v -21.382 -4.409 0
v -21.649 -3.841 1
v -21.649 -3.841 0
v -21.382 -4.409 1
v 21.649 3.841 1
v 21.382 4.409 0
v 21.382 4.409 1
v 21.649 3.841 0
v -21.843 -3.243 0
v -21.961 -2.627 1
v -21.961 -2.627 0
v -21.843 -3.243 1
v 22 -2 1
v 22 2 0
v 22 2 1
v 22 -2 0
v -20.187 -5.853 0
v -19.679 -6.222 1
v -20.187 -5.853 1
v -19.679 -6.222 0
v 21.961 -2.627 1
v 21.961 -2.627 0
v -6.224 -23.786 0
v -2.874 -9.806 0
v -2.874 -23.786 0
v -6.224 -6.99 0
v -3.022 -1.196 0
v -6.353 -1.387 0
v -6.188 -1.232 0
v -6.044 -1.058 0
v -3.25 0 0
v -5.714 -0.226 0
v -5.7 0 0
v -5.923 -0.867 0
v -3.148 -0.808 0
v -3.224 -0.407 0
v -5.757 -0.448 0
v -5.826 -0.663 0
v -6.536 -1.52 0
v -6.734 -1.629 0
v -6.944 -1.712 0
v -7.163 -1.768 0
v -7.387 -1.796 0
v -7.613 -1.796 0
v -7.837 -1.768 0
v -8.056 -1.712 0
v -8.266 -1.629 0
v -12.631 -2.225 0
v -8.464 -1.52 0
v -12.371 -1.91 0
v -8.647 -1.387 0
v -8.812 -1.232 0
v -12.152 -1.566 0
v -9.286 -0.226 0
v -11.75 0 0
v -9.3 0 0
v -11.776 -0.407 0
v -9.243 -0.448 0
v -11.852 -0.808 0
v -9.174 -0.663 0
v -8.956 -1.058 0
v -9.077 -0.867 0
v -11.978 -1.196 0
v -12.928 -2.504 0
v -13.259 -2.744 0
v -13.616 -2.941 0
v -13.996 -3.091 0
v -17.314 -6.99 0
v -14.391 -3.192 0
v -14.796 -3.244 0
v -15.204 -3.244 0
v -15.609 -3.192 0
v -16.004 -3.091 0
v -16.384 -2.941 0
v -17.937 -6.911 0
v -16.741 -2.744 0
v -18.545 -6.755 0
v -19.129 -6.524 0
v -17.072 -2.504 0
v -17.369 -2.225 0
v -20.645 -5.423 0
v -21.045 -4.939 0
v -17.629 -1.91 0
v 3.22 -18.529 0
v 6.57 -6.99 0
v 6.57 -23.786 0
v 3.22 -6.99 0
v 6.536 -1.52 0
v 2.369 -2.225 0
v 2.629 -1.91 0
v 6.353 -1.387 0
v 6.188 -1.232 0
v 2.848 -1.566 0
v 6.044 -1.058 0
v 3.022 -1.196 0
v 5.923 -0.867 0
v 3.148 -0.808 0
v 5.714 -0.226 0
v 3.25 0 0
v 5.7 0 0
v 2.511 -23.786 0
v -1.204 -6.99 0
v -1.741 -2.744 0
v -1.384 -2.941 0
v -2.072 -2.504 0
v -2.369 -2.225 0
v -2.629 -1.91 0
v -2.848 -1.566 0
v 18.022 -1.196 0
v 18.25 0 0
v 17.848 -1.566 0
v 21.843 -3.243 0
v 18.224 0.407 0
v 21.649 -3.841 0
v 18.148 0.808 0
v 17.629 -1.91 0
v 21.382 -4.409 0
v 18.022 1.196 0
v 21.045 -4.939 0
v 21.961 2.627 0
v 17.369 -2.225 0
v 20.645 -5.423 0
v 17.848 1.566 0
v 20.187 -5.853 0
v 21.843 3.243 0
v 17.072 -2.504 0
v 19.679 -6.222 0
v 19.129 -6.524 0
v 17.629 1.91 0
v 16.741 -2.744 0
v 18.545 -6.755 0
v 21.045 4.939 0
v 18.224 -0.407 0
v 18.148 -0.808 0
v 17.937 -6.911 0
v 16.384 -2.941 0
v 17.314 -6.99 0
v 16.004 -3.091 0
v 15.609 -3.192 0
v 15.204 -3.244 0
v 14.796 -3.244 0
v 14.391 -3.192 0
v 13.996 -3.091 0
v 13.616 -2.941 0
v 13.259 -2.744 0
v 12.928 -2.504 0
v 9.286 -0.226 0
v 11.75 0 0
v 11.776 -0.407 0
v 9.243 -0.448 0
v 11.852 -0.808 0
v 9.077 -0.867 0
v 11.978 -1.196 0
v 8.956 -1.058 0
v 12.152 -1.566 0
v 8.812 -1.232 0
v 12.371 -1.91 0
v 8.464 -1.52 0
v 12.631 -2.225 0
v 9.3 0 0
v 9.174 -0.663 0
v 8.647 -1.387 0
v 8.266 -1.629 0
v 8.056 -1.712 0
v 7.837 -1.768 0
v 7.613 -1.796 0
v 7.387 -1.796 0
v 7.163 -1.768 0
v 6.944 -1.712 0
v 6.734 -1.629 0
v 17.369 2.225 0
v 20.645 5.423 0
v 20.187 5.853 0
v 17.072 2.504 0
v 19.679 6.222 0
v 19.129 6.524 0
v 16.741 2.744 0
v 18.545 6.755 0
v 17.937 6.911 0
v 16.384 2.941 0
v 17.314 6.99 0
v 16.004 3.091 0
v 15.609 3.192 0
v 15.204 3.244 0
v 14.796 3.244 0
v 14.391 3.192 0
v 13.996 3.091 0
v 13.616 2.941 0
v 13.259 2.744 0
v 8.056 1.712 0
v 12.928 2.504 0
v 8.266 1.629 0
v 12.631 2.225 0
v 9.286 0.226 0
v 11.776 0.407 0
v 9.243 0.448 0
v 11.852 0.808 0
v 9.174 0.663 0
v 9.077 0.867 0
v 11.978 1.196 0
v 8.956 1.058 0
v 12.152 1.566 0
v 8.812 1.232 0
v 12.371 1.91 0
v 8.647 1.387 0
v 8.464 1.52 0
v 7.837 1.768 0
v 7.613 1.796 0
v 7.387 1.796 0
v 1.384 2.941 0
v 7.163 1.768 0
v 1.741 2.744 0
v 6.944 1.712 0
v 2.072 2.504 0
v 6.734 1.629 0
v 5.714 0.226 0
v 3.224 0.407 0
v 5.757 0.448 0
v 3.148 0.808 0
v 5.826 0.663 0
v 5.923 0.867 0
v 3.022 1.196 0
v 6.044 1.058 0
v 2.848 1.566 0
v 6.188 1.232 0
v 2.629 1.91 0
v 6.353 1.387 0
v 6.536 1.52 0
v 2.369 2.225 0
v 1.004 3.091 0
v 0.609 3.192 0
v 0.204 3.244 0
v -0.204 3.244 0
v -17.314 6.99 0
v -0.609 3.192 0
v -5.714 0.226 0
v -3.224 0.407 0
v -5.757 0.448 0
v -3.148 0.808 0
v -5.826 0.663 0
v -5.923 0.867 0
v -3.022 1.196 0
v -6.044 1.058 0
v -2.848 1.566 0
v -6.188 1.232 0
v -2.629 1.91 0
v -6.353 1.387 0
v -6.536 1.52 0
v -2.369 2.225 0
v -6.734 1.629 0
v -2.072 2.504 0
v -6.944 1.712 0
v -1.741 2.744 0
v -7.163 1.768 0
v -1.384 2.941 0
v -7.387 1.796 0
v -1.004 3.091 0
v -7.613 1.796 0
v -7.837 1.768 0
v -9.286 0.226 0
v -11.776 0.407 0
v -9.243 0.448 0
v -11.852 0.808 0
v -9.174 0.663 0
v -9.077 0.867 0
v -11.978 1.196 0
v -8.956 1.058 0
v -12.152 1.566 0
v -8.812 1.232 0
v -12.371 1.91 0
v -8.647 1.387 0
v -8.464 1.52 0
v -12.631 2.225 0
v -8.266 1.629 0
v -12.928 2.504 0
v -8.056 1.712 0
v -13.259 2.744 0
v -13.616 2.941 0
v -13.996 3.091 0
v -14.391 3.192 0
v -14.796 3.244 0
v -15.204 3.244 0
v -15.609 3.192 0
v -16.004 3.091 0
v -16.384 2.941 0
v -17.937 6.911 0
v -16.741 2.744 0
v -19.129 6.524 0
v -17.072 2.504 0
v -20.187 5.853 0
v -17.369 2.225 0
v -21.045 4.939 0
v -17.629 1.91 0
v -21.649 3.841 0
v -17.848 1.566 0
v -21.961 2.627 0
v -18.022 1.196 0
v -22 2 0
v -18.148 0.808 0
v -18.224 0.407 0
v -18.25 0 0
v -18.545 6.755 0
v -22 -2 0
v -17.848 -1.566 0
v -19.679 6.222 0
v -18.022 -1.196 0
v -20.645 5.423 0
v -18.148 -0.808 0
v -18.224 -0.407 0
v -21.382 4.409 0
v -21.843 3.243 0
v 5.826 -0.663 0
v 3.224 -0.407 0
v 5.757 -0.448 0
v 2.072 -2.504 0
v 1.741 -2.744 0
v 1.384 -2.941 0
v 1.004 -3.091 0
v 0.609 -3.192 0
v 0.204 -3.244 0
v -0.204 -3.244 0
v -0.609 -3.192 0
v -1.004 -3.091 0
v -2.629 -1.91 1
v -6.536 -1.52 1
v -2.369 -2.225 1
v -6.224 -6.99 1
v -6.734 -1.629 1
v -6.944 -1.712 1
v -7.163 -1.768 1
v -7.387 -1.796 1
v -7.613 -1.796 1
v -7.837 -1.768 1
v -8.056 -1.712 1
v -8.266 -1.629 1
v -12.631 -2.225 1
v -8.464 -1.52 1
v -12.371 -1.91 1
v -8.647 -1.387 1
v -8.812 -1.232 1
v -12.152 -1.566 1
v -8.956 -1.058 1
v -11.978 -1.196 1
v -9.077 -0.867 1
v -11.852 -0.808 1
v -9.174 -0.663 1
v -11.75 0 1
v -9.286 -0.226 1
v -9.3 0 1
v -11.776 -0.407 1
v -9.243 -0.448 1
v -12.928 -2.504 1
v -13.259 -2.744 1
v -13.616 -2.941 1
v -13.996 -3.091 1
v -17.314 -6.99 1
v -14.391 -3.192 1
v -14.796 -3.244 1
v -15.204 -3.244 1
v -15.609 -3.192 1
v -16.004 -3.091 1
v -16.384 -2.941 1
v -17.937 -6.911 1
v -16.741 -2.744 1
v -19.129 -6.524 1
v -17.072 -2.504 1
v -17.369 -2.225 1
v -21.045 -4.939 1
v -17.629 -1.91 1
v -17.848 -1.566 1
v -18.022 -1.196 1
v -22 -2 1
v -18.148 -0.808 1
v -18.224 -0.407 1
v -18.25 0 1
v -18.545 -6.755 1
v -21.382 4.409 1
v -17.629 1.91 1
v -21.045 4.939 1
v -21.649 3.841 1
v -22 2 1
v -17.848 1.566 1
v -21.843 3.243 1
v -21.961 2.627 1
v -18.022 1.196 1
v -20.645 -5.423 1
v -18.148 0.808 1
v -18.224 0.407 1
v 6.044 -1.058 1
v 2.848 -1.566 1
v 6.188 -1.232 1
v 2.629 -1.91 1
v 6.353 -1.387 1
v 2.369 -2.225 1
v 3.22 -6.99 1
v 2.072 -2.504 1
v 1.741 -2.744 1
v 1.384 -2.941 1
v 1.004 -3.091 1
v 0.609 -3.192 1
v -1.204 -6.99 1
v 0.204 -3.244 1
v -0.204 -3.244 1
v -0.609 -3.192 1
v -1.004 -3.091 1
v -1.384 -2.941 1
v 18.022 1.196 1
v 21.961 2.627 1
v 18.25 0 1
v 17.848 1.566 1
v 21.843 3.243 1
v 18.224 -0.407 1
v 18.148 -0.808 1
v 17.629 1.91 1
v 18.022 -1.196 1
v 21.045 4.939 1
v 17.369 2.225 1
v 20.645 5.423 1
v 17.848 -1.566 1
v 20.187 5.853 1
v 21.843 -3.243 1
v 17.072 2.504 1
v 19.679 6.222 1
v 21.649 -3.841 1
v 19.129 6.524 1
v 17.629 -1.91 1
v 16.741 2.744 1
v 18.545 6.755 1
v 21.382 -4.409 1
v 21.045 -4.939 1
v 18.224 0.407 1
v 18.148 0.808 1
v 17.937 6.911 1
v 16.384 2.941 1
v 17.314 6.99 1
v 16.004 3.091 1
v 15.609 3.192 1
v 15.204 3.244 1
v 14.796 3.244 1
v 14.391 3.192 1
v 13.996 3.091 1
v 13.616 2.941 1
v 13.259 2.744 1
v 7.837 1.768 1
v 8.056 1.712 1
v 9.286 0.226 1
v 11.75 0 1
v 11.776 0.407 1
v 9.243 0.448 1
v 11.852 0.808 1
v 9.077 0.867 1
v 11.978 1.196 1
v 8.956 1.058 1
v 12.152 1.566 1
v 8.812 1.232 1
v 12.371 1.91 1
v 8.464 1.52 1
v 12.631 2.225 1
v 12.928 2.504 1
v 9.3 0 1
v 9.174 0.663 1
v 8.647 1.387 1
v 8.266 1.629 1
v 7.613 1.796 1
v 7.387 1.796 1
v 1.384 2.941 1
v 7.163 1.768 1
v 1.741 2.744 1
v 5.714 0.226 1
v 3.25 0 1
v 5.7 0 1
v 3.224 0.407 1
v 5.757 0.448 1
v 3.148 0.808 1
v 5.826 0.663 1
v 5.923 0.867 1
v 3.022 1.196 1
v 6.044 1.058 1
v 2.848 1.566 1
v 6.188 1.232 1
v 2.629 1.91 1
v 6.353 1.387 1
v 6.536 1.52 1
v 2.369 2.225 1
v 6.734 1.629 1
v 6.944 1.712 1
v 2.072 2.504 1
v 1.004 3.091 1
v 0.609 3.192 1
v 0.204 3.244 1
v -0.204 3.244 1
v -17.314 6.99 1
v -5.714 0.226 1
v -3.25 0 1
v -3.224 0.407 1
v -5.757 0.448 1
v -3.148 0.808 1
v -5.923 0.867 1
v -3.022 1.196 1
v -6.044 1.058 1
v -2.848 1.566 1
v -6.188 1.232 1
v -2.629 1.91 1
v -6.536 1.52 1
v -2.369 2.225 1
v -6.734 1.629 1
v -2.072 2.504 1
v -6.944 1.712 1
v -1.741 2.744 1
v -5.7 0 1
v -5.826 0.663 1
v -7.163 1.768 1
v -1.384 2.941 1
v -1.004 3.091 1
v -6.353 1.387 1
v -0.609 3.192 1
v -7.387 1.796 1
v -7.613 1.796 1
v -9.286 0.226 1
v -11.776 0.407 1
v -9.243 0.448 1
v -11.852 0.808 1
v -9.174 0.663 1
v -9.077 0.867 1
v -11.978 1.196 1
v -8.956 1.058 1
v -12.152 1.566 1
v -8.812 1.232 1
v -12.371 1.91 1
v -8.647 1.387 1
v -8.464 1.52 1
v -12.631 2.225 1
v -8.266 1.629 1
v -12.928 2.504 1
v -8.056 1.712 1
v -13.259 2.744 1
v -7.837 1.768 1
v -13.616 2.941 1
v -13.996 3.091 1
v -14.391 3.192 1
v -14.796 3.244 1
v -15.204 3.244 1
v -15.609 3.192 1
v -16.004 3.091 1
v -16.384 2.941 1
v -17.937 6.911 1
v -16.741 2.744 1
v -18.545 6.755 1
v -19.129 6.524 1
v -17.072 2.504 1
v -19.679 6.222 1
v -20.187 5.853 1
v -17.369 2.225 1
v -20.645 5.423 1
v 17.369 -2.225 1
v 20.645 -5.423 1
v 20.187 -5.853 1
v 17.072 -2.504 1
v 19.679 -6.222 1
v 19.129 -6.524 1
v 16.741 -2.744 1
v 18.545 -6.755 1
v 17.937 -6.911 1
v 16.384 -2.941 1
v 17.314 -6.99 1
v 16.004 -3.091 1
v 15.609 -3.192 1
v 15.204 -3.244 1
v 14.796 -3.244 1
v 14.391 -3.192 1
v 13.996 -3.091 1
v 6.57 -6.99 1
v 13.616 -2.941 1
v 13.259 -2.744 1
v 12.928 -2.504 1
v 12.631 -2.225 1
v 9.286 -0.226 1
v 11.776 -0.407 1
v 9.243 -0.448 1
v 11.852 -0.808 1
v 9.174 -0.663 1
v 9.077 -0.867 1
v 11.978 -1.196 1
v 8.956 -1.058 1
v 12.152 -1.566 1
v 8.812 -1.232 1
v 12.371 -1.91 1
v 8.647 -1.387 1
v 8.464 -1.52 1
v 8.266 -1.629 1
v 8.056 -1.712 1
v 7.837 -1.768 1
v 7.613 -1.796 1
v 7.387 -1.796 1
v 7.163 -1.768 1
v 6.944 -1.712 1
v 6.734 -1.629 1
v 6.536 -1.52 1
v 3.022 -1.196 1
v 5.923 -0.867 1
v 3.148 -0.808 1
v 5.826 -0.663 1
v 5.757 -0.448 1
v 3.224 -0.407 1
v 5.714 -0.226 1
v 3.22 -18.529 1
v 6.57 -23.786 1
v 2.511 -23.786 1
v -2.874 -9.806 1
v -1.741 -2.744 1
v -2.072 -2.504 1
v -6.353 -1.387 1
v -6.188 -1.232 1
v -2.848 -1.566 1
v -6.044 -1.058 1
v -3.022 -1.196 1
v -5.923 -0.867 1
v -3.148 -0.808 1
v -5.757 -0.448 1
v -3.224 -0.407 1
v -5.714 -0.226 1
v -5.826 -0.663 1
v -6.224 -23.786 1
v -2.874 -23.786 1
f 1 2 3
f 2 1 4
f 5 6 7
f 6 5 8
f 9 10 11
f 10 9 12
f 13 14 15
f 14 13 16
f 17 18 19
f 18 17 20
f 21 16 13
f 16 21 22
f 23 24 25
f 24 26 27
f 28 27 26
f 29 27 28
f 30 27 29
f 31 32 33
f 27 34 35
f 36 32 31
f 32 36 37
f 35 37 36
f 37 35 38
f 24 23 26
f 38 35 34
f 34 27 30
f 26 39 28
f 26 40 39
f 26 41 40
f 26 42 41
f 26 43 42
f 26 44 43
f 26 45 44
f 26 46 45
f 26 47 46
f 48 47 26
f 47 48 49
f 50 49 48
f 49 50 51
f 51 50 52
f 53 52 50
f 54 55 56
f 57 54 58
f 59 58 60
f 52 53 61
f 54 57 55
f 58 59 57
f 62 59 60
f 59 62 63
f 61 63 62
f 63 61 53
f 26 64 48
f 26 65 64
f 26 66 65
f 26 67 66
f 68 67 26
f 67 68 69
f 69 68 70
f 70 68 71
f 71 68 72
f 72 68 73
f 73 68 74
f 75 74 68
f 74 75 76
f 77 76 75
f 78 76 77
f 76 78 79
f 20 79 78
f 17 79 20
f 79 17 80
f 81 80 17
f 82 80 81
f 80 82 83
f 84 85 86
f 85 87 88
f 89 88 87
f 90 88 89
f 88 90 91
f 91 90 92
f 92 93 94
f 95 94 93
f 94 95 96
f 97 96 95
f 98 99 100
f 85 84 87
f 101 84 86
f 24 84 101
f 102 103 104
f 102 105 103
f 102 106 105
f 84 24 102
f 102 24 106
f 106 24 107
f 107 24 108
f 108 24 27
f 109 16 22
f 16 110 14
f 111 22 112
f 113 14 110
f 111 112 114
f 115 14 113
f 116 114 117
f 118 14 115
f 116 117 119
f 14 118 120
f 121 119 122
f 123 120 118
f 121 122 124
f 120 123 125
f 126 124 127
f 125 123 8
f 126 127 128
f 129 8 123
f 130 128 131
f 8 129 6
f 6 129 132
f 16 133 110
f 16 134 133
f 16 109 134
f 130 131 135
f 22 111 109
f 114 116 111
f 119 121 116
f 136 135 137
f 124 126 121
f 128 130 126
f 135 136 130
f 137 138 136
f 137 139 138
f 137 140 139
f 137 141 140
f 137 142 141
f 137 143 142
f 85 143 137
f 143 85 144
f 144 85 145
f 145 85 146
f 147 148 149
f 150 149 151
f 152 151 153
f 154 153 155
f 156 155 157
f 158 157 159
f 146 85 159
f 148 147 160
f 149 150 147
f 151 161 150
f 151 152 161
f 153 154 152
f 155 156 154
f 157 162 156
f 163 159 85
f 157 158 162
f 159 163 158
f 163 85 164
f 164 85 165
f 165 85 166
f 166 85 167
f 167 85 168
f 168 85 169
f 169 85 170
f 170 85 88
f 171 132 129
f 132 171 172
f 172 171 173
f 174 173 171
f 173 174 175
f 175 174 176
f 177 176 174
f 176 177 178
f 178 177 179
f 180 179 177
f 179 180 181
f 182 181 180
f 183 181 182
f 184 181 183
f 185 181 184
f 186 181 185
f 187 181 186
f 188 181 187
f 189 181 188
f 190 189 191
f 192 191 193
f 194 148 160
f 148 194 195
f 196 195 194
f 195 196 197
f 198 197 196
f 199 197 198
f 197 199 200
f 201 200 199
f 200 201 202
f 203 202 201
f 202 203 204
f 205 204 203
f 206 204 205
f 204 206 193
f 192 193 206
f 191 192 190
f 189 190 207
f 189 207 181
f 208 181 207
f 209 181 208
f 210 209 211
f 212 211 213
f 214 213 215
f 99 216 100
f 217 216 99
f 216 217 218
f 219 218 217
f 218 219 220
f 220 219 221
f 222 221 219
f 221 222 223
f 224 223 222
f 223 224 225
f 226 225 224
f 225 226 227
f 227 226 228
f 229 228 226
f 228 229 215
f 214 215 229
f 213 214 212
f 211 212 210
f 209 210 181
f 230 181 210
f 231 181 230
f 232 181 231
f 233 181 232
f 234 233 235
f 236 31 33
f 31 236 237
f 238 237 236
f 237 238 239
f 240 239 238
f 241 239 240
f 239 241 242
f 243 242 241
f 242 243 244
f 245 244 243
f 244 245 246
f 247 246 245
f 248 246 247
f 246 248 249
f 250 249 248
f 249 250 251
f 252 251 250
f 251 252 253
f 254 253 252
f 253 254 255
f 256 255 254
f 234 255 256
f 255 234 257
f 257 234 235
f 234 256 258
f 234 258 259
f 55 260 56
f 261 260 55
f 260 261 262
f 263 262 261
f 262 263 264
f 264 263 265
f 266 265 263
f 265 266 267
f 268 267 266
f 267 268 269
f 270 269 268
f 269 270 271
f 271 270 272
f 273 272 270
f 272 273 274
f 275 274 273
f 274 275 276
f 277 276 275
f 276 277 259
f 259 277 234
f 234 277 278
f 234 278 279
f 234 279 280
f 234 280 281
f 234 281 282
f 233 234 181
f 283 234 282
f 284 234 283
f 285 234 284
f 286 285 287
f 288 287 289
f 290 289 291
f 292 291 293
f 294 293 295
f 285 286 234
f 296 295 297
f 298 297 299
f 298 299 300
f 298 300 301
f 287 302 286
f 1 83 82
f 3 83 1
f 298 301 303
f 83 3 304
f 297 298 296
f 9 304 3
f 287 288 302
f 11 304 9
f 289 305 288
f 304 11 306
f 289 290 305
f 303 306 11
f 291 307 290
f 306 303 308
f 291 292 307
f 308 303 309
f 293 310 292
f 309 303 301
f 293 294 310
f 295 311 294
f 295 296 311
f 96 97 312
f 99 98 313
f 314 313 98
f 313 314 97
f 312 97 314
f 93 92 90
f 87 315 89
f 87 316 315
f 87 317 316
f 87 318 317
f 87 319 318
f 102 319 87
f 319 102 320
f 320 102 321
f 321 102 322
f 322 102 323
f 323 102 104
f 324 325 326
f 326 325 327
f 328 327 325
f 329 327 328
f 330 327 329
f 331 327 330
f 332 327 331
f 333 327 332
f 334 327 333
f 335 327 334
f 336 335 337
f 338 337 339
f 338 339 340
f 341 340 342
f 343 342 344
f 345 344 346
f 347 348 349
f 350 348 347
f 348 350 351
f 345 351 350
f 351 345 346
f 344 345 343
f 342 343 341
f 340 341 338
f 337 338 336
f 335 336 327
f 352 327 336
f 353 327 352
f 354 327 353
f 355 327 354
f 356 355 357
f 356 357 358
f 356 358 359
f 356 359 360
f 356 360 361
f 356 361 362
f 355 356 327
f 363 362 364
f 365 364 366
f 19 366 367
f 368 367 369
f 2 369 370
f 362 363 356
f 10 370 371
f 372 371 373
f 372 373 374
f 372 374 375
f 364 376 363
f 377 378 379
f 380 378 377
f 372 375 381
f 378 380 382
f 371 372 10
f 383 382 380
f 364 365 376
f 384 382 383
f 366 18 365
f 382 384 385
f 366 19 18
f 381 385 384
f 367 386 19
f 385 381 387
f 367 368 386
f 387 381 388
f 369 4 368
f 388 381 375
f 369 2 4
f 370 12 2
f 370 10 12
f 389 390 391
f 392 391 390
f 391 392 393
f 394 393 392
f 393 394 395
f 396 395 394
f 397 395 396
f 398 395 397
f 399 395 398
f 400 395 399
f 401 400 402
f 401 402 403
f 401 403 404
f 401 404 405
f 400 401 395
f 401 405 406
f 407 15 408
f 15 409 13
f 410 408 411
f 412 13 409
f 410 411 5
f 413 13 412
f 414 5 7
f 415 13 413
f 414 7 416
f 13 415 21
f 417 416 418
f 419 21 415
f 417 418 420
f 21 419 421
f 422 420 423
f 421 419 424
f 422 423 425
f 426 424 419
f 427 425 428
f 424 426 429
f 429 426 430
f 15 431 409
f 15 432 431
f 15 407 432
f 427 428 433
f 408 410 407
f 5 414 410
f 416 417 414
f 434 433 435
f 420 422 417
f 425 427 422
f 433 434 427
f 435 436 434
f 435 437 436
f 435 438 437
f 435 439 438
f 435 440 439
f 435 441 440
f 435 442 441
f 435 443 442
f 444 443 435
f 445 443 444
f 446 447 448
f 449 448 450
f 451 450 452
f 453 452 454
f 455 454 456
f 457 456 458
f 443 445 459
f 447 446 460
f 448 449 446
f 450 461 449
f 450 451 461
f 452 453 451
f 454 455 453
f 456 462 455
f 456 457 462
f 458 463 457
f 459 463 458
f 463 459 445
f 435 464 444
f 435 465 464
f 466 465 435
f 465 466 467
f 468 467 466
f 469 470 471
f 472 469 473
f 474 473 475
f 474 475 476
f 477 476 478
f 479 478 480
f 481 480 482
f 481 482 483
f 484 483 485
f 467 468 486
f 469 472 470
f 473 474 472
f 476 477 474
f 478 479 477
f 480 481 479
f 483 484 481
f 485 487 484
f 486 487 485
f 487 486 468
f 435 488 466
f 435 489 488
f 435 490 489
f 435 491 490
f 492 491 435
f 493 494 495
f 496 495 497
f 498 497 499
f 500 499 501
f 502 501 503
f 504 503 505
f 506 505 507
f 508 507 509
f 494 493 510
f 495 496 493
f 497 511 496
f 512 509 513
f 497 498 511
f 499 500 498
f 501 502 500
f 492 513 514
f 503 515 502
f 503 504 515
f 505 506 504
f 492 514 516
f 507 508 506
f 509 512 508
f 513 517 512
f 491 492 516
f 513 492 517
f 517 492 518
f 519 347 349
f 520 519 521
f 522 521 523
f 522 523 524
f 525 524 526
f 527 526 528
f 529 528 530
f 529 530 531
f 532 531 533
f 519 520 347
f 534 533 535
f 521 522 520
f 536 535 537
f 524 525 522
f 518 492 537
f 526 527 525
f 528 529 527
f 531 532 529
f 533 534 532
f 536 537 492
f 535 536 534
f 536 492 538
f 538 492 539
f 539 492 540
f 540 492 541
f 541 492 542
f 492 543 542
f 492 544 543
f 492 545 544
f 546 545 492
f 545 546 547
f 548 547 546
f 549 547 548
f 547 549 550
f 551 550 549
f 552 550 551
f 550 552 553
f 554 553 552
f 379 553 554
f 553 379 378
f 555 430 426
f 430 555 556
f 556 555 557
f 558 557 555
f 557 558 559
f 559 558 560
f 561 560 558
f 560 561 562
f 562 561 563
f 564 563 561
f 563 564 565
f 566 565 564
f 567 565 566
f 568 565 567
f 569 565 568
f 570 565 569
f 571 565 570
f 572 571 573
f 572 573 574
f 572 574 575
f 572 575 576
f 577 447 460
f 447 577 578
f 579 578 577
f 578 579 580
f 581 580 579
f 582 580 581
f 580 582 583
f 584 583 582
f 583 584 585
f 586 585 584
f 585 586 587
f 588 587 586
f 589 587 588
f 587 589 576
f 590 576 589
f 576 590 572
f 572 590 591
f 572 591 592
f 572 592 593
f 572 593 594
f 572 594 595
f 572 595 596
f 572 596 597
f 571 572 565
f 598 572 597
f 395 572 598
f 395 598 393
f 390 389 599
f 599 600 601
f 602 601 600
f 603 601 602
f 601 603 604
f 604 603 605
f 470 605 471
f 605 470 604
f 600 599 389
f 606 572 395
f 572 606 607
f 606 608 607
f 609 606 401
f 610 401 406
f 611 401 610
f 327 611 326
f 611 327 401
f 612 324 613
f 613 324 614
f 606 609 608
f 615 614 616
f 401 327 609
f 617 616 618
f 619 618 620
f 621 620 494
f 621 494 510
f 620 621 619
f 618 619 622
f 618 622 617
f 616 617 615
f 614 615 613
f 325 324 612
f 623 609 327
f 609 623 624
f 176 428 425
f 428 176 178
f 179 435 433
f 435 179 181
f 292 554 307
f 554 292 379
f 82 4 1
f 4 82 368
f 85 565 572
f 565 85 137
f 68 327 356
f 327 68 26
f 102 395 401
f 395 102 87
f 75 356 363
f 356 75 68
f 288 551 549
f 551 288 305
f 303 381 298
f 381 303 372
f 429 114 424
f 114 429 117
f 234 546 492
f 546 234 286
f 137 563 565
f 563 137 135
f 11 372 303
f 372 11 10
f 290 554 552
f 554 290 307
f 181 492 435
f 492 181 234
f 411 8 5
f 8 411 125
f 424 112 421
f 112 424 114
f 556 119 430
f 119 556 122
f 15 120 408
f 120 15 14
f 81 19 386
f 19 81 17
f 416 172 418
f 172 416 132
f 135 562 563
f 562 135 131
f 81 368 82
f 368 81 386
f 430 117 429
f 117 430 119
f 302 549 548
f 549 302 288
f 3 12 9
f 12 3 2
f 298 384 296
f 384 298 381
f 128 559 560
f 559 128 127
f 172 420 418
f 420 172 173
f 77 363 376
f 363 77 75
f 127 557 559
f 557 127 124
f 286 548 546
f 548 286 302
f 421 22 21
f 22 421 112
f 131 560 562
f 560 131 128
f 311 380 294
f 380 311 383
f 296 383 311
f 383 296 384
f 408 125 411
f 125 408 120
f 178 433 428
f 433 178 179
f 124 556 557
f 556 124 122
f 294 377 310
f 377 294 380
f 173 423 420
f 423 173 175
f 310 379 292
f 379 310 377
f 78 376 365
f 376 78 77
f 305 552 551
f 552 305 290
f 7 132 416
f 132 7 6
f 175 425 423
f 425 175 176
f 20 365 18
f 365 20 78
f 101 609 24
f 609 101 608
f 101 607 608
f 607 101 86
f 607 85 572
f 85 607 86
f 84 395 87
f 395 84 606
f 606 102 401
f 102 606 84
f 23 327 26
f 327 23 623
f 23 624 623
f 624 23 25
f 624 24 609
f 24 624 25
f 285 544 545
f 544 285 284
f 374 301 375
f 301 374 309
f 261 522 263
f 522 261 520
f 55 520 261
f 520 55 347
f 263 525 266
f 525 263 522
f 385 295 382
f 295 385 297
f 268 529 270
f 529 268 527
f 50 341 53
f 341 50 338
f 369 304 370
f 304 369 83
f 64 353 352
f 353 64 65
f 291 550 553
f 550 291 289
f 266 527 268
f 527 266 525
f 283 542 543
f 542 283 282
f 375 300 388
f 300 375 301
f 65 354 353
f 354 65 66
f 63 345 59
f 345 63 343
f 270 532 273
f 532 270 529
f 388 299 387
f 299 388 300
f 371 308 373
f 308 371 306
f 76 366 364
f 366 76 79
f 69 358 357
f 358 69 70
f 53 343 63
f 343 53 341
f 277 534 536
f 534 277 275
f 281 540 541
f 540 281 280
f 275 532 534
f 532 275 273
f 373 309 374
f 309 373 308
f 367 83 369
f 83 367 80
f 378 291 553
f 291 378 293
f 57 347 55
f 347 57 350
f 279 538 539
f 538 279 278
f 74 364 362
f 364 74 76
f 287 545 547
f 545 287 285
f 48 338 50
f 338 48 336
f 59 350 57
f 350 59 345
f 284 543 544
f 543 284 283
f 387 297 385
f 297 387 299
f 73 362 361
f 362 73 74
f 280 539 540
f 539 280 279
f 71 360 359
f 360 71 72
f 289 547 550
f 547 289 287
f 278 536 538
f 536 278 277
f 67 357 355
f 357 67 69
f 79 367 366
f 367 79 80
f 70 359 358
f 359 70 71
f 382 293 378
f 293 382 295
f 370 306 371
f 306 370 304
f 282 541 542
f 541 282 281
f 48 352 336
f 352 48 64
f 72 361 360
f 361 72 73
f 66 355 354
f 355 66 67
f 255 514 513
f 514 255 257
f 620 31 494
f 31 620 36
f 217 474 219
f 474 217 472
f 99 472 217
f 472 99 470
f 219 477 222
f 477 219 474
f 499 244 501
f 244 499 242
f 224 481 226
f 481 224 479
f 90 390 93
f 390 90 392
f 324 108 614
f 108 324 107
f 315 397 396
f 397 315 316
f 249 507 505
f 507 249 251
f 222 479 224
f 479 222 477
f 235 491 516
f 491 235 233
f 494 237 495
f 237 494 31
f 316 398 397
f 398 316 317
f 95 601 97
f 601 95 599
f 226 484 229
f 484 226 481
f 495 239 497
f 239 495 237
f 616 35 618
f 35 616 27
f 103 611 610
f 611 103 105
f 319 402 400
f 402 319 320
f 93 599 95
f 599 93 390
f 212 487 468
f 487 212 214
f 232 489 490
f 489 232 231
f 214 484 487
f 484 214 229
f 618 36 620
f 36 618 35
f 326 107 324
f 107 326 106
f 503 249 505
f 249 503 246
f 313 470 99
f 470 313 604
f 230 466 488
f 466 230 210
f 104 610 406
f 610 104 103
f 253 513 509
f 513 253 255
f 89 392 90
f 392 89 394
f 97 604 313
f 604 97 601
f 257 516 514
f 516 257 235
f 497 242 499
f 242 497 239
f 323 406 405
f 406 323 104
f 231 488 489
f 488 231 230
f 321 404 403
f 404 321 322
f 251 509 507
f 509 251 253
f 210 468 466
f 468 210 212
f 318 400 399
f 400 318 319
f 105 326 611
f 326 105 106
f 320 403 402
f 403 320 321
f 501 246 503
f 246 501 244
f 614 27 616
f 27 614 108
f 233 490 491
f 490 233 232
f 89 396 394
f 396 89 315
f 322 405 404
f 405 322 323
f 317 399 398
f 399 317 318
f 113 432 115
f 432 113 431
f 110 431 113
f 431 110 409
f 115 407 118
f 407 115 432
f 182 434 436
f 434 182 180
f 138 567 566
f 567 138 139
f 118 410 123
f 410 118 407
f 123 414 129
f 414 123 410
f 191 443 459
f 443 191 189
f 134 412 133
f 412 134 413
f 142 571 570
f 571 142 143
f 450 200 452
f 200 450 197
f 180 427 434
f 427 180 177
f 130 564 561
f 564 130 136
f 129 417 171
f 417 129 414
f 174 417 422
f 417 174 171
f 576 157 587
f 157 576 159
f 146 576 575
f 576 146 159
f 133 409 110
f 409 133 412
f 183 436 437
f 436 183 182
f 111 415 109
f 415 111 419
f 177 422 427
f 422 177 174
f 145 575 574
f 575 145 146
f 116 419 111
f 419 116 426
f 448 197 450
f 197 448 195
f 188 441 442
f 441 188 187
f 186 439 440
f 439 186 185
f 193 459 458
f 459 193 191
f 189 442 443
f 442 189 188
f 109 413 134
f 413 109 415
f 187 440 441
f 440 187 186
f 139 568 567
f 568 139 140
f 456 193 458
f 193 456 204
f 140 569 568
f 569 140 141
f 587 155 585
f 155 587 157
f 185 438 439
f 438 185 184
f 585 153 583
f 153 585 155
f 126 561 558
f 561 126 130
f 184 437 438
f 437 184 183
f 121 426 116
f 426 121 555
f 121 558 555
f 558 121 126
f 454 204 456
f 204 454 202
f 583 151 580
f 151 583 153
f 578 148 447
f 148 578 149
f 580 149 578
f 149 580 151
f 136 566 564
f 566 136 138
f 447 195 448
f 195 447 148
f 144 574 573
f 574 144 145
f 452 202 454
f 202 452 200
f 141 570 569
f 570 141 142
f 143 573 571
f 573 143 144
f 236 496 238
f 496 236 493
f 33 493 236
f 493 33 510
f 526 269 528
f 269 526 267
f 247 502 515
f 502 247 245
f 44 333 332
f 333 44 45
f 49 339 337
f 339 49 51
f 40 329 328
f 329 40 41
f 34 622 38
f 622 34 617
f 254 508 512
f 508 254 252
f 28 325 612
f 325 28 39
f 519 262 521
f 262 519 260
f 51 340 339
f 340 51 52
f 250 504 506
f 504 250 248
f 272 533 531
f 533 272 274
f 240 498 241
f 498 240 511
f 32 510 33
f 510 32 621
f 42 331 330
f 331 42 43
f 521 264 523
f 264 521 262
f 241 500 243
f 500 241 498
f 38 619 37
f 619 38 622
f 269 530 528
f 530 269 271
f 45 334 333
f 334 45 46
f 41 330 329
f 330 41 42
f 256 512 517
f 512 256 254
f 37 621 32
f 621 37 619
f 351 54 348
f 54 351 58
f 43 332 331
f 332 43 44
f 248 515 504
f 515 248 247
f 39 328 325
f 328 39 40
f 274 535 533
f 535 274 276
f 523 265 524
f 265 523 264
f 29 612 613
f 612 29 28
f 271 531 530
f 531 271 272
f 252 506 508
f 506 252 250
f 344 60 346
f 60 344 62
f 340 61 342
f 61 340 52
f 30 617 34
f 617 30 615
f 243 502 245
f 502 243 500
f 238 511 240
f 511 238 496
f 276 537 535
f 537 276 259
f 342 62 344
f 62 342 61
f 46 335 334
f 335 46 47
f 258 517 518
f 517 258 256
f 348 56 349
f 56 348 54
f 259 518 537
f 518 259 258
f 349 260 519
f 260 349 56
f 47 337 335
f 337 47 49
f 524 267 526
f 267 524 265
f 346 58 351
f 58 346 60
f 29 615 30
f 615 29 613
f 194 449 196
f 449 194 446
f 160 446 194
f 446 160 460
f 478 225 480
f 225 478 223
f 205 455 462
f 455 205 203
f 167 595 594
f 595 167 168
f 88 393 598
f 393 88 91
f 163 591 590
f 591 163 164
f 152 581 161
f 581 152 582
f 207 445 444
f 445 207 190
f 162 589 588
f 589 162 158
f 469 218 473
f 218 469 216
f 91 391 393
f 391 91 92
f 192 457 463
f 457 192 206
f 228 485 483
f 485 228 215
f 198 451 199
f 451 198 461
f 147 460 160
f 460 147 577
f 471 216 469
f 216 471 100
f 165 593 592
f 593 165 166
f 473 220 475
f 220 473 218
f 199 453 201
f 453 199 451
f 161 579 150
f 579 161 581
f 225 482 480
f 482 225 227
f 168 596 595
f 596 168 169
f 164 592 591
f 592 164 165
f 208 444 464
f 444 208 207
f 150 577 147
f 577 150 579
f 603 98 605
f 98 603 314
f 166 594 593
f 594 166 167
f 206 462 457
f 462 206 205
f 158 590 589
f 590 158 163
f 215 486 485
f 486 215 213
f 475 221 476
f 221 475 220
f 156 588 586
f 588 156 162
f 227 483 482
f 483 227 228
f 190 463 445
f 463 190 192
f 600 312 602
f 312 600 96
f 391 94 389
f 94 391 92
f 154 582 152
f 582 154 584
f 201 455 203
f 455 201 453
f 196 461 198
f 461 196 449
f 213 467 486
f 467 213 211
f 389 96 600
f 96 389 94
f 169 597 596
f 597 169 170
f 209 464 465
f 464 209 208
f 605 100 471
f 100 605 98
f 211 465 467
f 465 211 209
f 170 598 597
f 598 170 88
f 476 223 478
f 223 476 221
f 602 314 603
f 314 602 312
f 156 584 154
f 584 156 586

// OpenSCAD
$fn = 50;


difference() {
	union() {
		hull() {
			translate(v = [-17.0000000000, 2.0000000000, 0]) {
				cylinder(h = 1, r = 5);
			}
			translate(v = [17.0000000000, 2.0000000000, 0]) {
				cylinder(h = 1, r = 5);
			}
			translate(v = [-17.0000000000, -2.0000000000, 0]) {
				cylinder(h = 1, r = 5);
			}
			translate(v = [17.0000000000, -2.0000000000, 0]) {
				cylinder(h = 1, r = 5);
			}
		}
		translate(v = [0, -5, 0]) {
			linear_extrude(height = 1) {
				text(font = "DejaVu Sans Mono:style=Bold", halign = "center", size = 19.0000000000, text = "N", valign = "top");
			}
		}
	}
	union() {
		translate(v = [-15.0000000000, 0.0000000000, 0]) {
			translate(v = [0, 0, -100]) {
				cylinder(h = 200, r = 3.2500000000);
			}
		}
		translate(v = [0, 0, -100]) {
			cylinder(h = 200, r = 3.2500000000);
		}
		translate(v = [15.0000000000, 0.0000000000, 0]) {
			translate(v = [0, 0, -100]) {
				cylinder(h = 200, r = 3.2500000000);
			}
		}
		translate(v = [-15.0000000000, 0.0000000000, 0]) {
			translate(v = [0, 0, -100]) {
				cylinder(h = 200, r = 1.8000000000);
			}
		}
		translate(v = [-7.5000000000, 0.0000000000, 0]) {
			translate(v = [0, 0, -100]) {
				cylinder(h = 200, r = 1.8000000000);
			}
		}
		translate(v = [0, 0, -100]) {
			cylinder(h = 200, r = 1.8000000000);
		}
		translate(v = [7.5000000000, 0.0000000000, 0]) {
			translate(v = [0, 0, -100]) {
				cylinder(h = 200, r = 1.8000000000);
			}
		}
		translate(v = [15.0000000000, 0.0000000000, 0]) {
			translate(v = [0, 0, -100]) {
				cylinder(h = 200, r = 1.8000000000);
			}
		}
	}
}
